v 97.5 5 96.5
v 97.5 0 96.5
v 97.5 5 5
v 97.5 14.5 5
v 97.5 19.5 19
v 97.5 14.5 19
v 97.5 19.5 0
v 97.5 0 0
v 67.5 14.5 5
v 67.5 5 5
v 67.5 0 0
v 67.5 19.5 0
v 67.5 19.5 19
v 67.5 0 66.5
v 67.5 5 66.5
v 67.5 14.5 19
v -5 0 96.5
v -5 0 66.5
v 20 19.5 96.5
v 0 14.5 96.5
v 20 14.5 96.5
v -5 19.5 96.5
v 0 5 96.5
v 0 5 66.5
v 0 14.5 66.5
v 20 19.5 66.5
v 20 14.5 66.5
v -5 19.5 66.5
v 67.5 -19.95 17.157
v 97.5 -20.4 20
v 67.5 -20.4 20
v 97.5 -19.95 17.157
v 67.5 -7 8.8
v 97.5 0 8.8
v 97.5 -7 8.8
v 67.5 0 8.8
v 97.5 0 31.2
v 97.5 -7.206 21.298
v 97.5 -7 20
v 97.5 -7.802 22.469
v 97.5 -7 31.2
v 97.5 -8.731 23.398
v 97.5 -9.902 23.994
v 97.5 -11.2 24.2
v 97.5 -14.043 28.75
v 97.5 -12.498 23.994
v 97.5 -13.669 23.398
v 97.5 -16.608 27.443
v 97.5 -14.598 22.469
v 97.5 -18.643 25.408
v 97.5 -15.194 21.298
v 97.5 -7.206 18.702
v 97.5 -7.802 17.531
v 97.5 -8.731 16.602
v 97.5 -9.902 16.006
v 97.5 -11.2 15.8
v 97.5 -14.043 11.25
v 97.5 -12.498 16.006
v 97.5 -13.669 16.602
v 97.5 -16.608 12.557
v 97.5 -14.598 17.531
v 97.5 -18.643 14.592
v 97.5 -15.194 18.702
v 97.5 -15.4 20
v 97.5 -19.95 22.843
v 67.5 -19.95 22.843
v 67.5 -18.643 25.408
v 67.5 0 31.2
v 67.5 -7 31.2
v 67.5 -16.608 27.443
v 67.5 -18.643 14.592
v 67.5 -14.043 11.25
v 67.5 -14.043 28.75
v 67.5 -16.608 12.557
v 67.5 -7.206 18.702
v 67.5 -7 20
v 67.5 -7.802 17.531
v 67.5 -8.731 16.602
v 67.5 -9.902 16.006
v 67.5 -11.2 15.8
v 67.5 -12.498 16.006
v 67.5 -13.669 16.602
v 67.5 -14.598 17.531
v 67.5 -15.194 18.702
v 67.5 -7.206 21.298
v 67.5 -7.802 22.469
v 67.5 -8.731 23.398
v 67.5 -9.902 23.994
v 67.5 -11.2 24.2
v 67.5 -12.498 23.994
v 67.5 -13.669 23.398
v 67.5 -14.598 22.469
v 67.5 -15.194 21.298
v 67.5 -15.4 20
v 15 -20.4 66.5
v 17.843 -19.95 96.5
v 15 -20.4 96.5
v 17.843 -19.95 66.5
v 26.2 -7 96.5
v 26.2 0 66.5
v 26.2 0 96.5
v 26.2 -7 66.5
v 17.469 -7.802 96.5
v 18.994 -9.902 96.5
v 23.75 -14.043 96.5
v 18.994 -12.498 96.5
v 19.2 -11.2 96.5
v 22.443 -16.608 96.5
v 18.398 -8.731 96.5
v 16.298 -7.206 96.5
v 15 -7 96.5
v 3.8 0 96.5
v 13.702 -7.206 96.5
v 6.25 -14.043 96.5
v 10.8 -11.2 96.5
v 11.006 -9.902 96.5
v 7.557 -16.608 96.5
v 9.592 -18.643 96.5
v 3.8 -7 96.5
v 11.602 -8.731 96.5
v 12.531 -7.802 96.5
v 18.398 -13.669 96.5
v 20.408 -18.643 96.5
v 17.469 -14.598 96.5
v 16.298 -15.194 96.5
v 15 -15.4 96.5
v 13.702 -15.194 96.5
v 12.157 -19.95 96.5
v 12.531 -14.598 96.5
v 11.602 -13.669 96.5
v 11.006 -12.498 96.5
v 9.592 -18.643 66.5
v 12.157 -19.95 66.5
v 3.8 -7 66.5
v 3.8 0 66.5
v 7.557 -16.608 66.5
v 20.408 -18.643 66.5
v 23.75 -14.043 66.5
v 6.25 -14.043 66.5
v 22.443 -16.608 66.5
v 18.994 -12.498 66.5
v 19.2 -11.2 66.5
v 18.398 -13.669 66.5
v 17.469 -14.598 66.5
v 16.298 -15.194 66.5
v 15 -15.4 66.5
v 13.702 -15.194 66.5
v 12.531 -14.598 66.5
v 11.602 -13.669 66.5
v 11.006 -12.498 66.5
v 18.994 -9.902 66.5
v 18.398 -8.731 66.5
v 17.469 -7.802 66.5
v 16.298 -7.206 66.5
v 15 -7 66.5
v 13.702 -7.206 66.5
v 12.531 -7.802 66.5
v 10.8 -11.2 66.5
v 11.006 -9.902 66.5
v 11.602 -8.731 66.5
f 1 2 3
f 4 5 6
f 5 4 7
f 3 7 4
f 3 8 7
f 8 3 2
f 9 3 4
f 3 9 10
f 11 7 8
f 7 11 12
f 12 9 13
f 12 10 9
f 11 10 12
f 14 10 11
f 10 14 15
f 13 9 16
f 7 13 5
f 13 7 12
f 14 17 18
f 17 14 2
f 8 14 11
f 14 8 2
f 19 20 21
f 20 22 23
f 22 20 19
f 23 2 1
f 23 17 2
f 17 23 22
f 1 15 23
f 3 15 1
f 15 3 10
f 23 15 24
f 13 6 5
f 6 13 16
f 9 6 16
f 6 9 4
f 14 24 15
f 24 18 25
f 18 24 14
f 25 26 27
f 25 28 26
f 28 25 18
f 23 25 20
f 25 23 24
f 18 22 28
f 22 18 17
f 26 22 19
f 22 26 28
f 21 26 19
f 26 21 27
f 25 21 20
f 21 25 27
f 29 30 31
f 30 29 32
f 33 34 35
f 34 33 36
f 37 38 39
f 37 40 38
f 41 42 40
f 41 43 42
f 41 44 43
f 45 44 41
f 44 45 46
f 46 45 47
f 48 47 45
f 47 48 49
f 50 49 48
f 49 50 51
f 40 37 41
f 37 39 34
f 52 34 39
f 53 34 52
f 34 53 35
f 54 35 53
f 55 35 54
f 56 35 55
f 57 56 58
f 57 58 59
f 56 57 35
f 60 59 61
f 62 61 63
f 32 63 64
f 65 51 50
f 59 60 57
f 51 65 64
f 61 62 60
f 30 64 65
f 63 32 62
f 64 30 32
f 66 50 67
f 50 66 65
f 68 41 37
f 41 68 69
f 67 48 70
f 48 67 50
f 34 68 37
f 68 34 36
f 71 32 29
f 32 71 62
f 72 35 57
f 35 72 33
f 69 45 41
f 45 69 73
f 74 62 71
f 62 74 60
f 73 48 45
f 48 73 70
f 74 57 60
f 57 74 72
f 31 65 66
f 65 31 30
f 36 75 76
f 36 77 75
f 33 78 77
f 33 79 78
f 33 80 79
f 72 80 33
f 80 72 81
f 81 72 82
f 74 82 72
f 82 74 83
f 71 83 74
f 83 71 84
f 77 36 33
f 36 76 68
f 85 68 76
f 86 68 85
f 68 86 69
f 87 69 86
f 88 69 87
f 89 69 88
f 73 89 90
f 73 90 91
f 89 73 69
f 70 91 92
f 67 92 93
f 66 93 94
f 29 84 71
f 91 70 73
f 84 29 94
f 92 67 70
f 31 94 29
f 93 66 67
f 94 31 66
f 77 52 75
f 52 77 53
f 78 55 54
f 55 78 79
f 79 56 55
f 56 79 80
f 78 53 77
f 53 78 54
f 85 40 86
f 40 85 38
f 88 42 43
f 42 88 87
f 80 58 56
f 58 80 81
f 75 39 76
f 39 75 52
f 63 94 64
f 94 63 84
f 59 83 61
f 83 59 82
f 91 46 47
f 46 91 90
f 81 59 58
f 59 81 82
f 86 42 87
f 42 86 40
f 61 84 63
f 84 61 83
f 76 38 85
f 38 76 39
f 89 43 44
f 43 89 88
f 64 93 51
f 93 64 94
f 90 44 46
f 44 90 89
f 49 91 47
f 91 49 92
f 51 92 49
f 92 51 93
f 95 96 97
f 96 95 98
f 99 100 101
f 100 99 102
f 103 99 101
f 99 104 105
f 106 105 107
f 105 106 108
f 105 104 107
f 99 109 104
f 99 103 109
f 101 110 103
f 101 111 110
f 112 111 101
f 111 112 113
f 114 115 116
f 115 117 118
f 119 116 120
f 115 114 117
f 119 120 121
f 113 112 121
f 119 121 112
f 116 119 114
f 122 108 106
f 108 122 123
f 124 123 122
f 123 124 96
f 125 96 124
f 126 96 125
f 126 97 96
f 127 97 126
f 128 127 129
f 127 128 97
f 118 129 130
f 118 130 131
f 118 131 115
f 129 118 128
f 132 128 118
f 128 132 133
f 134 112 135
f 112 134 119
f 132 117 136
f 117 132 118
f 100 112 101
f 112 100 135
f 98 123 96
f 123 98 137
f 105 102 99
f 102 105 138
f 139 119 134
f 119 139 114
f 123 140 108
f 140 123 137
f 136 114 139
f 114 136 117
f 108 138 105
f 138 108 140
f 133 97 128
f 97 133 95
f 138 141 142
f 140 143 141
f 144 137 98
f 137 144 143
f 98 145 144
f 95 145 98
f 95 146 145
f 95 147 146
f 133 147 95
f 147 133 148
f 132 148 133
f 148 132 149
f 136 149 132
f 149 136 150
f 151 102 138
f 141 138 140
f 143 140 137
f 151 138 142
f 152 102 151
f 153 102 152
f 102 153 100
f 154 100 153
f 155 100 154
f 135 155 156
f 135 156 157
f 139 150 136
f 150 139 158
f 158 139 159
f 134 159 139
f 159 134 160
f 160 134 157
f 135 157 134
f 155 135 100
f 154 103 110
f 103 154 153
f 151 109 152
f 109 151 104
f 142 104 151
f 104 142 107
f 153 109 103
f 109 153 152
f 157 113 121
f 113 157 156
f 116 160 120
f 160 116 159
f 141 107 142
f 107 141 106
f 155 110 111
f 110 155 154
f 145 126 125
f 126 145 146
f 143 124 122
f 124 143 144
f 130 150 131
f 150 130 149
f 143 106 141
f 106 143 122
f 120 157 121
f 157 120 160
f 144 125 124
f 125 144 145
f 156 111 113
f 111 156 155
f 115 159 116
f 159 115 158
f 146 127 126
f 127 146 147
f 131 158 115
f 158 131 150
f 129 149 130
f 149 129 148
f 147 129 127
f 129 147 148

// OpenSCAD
tablet_width = 335;
tablet_height = 223;
tablet_depth = 9.0;
tablet_depth_tolerance = 0.5;

clamp_width = 30;
clamp_height_small = 14;
clamp_height_large = 20;
clamp_wall = 5;

clamp_bottom_dist = 200;
clamp_side_dist = 40;

rail_dia = 8.0;
rail_hole = rail_dia + 0.4;
rail_dist = 2;
rail_add_len = 50;
rail_clamp_width = clamp_width;
rail_clamp_add_height = 4;
rail_clamp_off = 20;

$fn = 20;

print_view = true;

module clamp(height, back_height) {
    cube([clamp_width, (2 * clamp_wall) + tablet_depth + tablet_depth_tolerance, clamp_wall]);
    
    translate([0, 0, clamp_wall])
        cube([clamp_width, clamp_wall, back_height]);
    
    translate([0, clamp_wall + tablet_depth + tablet_depth_tolerance, clamp_wall])
        cube([clamp_width, clamp_wall, height]);
}

module rail_clamp() {
    translate([0, -clamp_wall - (rail_hole / 2) - rail_dist, 0])
    difference() {
        hull() {
            translate([0, (clamp_wall + rail_hole + rail_dist) / 2, rail_clamp_width / 2])
                cube([rail_hole + (2 * clamp_wall) + rail_clamp_add_height, clamp_wall + rail_dist, rail_clamp_width], center = true);
            
            cylinder(d = rail_hole + (2 * clamp_wall), h = rail_clamp_width);
        }
        
        translate([0, 0, -1])
            cylinder(d = rail_hole, h = rail_clamp_width + 2);
    }
}

module clamp_corner() {
    // bottom clamp
    translate([(tablet_width - clamp_bottom_dist) / 2, 0, 0])
        clamp(clamp_height_small, tablet_height / 2 - (clamp_side_dist / 2));
    
    // side clamp
    translate([-clamp_wall, 0, clamp_wall + ((tablet_height) / 2) - (clamp_side_dist / 2)])
        rotate([0, 90, 0])
        clamp(clamp_height_large, (tablet_width - clamp_bottom_dist) / 2);
    
    // bottom rail mount
    translate([(tablet_width - clamp_bottom_dist) / 2, 0, rail_clamp_off])
        rotate([0, 90, 0])
        rail_clamp();
    
    // side rail mount
    translate([rail_clamp_off - 5, 0, clamp_wall + ((tablet_height) / 2) - clamp_width - (clamp_side_dist / 2)])
        rail_clamp();
}

module rail_to_rail() {
    difference() {
        hull() {
            translate([rail_clamp_width / 2, 0, rail_clamp_width / 2])
                rotate([180, 90, 0])
                rail_clamp();
            
            translate([0, 0, 0])
                rail_clamp();
        }
        
        translate([0, -clamp_wall - (rail_hole / 2) - rail_dist, -1])
            cylinder(d = rail_hole, h = rail_clamp_width + 2);
            
        translate([rail_clamp_width / 2 + 1, clamp_wall + (rail_hole / 2) + rail_dist, rail_clamp_width / 2])
            rotate([180, 90, 0])
            cylinder(d = rail_hole, h = rail_clamp_width + 2);
    }
}

module visualization() {
    %translate([0, clamp_wall + (tablet_depth_tolerance / 2), clamp_wall])
        cube([tablet_width, tablet_depth, tablet_height]);

    color("yellow")
    clamp_corner();
    
    color("green")
    translate([0, 0, tablet_height + (2 * clamp_wall)])
        scale([1, 1, -1])
        clamp_corner();
    
    color("blue")
    translate([tablet_width, 0, 0])
        scale([-1, 1, 1])
        clamp_corner();
    
    color("red")
    translate([tablet_width, 0, tablet_height + (2 * clamp_wall)])
        scale([-1, 1, -1])
        clamp_corner();
    
    color("cyan")
    translate([tablet_width / 2, -rail_clamp_off - 2.5, rail_hole / 2 + 1])
        rail_to_rail();
    color("cyan")
    translate([tablet_width / 2, -rail_clamp_off - 2.5, tablet_height - rail_hole / 2 - rail_clamp_off])
        rail_to_rail();
    
    // center rail
    translate([tablet_width / 2, -rail_clamp_off * 3 / 2 - rail_hole / 2 + 0.5, -5])
        cylinder(d = rail_dia, h = tablet_height + 20);
    
    // top/bottom rails
    translate([(tablet_width - clamp_bottom_dist - rail_add_len) / 2, -rail_hole / 2 - rail_dist - 5, clamp_wall + rail_clamp_off - 5])
        rotate([0, 90, 0])
        cylinder(d = rail_dia, h = clamp_bottom_dist + rail_add_len);
    translate([(tablet_width - clamp_bottom_dist - rail_add_len) / 2, -rail_hole / 2 - rail_dist - 5, tablet_height + clamp_wall - rail_clamp_off + 5])
        rotate([0, 90, 0])
        cylinder(d = rail_dia, h = clamp_bottom_dist + rail_add_len);
    
    // side rails
    translate([rail_clamp_off - 5, -rail_hole / 2 - rail_dist - 5, clamp_wall + ((tablet_height - clamp_side_dist - rail_add_len) / 2) - clamp_width])
        cylinder(d = rail_dia, h = clamp_side_dist + rail_add_len + (2 * clamp_width));
    translate([tablet_width - rail_clamp_off + 5, -rail_hole / 2 - rail_dist - 5, clamp_wall + ((tablet_height - clamp_side_dist - rail_add_len) / 2) - clamp_width])
        cylinder(d = rail_dia, h = clamp_side_dist + rail_add_len + (2 * clamp_width));
}

module printplate_corners() {
    clamp_corner();
    
    //translate([0, 50, 0])
    //    rotate([0, 180, 0])
    //    scale([-1, 1, -1])
    //    clamp_corner();
    
    //translate([0, 100, clamp_wall])
    //    rotate([0, 90, 0])
    //    scale([-1, 1, 1])
    //    clamp_corner();
    
    //translate([0, 150, clamp_wall])
    //    rotate([0, -90, 0])
    //    scale([1, 1, -1])
    //    clamp_corner();
}

module printplate_rail_to_rail() {
    translate([25, 60, 0])
    rotate([0, 0, -90]) {
        rail_to_rail();
        translate([rail_clamp_width + 10, 0, 0])
            rail_to_rail();
    }
}

if (print_view) {
    printplate_corners();
    //printplate_rail_to_rail();
} else {
    visualization();
}
